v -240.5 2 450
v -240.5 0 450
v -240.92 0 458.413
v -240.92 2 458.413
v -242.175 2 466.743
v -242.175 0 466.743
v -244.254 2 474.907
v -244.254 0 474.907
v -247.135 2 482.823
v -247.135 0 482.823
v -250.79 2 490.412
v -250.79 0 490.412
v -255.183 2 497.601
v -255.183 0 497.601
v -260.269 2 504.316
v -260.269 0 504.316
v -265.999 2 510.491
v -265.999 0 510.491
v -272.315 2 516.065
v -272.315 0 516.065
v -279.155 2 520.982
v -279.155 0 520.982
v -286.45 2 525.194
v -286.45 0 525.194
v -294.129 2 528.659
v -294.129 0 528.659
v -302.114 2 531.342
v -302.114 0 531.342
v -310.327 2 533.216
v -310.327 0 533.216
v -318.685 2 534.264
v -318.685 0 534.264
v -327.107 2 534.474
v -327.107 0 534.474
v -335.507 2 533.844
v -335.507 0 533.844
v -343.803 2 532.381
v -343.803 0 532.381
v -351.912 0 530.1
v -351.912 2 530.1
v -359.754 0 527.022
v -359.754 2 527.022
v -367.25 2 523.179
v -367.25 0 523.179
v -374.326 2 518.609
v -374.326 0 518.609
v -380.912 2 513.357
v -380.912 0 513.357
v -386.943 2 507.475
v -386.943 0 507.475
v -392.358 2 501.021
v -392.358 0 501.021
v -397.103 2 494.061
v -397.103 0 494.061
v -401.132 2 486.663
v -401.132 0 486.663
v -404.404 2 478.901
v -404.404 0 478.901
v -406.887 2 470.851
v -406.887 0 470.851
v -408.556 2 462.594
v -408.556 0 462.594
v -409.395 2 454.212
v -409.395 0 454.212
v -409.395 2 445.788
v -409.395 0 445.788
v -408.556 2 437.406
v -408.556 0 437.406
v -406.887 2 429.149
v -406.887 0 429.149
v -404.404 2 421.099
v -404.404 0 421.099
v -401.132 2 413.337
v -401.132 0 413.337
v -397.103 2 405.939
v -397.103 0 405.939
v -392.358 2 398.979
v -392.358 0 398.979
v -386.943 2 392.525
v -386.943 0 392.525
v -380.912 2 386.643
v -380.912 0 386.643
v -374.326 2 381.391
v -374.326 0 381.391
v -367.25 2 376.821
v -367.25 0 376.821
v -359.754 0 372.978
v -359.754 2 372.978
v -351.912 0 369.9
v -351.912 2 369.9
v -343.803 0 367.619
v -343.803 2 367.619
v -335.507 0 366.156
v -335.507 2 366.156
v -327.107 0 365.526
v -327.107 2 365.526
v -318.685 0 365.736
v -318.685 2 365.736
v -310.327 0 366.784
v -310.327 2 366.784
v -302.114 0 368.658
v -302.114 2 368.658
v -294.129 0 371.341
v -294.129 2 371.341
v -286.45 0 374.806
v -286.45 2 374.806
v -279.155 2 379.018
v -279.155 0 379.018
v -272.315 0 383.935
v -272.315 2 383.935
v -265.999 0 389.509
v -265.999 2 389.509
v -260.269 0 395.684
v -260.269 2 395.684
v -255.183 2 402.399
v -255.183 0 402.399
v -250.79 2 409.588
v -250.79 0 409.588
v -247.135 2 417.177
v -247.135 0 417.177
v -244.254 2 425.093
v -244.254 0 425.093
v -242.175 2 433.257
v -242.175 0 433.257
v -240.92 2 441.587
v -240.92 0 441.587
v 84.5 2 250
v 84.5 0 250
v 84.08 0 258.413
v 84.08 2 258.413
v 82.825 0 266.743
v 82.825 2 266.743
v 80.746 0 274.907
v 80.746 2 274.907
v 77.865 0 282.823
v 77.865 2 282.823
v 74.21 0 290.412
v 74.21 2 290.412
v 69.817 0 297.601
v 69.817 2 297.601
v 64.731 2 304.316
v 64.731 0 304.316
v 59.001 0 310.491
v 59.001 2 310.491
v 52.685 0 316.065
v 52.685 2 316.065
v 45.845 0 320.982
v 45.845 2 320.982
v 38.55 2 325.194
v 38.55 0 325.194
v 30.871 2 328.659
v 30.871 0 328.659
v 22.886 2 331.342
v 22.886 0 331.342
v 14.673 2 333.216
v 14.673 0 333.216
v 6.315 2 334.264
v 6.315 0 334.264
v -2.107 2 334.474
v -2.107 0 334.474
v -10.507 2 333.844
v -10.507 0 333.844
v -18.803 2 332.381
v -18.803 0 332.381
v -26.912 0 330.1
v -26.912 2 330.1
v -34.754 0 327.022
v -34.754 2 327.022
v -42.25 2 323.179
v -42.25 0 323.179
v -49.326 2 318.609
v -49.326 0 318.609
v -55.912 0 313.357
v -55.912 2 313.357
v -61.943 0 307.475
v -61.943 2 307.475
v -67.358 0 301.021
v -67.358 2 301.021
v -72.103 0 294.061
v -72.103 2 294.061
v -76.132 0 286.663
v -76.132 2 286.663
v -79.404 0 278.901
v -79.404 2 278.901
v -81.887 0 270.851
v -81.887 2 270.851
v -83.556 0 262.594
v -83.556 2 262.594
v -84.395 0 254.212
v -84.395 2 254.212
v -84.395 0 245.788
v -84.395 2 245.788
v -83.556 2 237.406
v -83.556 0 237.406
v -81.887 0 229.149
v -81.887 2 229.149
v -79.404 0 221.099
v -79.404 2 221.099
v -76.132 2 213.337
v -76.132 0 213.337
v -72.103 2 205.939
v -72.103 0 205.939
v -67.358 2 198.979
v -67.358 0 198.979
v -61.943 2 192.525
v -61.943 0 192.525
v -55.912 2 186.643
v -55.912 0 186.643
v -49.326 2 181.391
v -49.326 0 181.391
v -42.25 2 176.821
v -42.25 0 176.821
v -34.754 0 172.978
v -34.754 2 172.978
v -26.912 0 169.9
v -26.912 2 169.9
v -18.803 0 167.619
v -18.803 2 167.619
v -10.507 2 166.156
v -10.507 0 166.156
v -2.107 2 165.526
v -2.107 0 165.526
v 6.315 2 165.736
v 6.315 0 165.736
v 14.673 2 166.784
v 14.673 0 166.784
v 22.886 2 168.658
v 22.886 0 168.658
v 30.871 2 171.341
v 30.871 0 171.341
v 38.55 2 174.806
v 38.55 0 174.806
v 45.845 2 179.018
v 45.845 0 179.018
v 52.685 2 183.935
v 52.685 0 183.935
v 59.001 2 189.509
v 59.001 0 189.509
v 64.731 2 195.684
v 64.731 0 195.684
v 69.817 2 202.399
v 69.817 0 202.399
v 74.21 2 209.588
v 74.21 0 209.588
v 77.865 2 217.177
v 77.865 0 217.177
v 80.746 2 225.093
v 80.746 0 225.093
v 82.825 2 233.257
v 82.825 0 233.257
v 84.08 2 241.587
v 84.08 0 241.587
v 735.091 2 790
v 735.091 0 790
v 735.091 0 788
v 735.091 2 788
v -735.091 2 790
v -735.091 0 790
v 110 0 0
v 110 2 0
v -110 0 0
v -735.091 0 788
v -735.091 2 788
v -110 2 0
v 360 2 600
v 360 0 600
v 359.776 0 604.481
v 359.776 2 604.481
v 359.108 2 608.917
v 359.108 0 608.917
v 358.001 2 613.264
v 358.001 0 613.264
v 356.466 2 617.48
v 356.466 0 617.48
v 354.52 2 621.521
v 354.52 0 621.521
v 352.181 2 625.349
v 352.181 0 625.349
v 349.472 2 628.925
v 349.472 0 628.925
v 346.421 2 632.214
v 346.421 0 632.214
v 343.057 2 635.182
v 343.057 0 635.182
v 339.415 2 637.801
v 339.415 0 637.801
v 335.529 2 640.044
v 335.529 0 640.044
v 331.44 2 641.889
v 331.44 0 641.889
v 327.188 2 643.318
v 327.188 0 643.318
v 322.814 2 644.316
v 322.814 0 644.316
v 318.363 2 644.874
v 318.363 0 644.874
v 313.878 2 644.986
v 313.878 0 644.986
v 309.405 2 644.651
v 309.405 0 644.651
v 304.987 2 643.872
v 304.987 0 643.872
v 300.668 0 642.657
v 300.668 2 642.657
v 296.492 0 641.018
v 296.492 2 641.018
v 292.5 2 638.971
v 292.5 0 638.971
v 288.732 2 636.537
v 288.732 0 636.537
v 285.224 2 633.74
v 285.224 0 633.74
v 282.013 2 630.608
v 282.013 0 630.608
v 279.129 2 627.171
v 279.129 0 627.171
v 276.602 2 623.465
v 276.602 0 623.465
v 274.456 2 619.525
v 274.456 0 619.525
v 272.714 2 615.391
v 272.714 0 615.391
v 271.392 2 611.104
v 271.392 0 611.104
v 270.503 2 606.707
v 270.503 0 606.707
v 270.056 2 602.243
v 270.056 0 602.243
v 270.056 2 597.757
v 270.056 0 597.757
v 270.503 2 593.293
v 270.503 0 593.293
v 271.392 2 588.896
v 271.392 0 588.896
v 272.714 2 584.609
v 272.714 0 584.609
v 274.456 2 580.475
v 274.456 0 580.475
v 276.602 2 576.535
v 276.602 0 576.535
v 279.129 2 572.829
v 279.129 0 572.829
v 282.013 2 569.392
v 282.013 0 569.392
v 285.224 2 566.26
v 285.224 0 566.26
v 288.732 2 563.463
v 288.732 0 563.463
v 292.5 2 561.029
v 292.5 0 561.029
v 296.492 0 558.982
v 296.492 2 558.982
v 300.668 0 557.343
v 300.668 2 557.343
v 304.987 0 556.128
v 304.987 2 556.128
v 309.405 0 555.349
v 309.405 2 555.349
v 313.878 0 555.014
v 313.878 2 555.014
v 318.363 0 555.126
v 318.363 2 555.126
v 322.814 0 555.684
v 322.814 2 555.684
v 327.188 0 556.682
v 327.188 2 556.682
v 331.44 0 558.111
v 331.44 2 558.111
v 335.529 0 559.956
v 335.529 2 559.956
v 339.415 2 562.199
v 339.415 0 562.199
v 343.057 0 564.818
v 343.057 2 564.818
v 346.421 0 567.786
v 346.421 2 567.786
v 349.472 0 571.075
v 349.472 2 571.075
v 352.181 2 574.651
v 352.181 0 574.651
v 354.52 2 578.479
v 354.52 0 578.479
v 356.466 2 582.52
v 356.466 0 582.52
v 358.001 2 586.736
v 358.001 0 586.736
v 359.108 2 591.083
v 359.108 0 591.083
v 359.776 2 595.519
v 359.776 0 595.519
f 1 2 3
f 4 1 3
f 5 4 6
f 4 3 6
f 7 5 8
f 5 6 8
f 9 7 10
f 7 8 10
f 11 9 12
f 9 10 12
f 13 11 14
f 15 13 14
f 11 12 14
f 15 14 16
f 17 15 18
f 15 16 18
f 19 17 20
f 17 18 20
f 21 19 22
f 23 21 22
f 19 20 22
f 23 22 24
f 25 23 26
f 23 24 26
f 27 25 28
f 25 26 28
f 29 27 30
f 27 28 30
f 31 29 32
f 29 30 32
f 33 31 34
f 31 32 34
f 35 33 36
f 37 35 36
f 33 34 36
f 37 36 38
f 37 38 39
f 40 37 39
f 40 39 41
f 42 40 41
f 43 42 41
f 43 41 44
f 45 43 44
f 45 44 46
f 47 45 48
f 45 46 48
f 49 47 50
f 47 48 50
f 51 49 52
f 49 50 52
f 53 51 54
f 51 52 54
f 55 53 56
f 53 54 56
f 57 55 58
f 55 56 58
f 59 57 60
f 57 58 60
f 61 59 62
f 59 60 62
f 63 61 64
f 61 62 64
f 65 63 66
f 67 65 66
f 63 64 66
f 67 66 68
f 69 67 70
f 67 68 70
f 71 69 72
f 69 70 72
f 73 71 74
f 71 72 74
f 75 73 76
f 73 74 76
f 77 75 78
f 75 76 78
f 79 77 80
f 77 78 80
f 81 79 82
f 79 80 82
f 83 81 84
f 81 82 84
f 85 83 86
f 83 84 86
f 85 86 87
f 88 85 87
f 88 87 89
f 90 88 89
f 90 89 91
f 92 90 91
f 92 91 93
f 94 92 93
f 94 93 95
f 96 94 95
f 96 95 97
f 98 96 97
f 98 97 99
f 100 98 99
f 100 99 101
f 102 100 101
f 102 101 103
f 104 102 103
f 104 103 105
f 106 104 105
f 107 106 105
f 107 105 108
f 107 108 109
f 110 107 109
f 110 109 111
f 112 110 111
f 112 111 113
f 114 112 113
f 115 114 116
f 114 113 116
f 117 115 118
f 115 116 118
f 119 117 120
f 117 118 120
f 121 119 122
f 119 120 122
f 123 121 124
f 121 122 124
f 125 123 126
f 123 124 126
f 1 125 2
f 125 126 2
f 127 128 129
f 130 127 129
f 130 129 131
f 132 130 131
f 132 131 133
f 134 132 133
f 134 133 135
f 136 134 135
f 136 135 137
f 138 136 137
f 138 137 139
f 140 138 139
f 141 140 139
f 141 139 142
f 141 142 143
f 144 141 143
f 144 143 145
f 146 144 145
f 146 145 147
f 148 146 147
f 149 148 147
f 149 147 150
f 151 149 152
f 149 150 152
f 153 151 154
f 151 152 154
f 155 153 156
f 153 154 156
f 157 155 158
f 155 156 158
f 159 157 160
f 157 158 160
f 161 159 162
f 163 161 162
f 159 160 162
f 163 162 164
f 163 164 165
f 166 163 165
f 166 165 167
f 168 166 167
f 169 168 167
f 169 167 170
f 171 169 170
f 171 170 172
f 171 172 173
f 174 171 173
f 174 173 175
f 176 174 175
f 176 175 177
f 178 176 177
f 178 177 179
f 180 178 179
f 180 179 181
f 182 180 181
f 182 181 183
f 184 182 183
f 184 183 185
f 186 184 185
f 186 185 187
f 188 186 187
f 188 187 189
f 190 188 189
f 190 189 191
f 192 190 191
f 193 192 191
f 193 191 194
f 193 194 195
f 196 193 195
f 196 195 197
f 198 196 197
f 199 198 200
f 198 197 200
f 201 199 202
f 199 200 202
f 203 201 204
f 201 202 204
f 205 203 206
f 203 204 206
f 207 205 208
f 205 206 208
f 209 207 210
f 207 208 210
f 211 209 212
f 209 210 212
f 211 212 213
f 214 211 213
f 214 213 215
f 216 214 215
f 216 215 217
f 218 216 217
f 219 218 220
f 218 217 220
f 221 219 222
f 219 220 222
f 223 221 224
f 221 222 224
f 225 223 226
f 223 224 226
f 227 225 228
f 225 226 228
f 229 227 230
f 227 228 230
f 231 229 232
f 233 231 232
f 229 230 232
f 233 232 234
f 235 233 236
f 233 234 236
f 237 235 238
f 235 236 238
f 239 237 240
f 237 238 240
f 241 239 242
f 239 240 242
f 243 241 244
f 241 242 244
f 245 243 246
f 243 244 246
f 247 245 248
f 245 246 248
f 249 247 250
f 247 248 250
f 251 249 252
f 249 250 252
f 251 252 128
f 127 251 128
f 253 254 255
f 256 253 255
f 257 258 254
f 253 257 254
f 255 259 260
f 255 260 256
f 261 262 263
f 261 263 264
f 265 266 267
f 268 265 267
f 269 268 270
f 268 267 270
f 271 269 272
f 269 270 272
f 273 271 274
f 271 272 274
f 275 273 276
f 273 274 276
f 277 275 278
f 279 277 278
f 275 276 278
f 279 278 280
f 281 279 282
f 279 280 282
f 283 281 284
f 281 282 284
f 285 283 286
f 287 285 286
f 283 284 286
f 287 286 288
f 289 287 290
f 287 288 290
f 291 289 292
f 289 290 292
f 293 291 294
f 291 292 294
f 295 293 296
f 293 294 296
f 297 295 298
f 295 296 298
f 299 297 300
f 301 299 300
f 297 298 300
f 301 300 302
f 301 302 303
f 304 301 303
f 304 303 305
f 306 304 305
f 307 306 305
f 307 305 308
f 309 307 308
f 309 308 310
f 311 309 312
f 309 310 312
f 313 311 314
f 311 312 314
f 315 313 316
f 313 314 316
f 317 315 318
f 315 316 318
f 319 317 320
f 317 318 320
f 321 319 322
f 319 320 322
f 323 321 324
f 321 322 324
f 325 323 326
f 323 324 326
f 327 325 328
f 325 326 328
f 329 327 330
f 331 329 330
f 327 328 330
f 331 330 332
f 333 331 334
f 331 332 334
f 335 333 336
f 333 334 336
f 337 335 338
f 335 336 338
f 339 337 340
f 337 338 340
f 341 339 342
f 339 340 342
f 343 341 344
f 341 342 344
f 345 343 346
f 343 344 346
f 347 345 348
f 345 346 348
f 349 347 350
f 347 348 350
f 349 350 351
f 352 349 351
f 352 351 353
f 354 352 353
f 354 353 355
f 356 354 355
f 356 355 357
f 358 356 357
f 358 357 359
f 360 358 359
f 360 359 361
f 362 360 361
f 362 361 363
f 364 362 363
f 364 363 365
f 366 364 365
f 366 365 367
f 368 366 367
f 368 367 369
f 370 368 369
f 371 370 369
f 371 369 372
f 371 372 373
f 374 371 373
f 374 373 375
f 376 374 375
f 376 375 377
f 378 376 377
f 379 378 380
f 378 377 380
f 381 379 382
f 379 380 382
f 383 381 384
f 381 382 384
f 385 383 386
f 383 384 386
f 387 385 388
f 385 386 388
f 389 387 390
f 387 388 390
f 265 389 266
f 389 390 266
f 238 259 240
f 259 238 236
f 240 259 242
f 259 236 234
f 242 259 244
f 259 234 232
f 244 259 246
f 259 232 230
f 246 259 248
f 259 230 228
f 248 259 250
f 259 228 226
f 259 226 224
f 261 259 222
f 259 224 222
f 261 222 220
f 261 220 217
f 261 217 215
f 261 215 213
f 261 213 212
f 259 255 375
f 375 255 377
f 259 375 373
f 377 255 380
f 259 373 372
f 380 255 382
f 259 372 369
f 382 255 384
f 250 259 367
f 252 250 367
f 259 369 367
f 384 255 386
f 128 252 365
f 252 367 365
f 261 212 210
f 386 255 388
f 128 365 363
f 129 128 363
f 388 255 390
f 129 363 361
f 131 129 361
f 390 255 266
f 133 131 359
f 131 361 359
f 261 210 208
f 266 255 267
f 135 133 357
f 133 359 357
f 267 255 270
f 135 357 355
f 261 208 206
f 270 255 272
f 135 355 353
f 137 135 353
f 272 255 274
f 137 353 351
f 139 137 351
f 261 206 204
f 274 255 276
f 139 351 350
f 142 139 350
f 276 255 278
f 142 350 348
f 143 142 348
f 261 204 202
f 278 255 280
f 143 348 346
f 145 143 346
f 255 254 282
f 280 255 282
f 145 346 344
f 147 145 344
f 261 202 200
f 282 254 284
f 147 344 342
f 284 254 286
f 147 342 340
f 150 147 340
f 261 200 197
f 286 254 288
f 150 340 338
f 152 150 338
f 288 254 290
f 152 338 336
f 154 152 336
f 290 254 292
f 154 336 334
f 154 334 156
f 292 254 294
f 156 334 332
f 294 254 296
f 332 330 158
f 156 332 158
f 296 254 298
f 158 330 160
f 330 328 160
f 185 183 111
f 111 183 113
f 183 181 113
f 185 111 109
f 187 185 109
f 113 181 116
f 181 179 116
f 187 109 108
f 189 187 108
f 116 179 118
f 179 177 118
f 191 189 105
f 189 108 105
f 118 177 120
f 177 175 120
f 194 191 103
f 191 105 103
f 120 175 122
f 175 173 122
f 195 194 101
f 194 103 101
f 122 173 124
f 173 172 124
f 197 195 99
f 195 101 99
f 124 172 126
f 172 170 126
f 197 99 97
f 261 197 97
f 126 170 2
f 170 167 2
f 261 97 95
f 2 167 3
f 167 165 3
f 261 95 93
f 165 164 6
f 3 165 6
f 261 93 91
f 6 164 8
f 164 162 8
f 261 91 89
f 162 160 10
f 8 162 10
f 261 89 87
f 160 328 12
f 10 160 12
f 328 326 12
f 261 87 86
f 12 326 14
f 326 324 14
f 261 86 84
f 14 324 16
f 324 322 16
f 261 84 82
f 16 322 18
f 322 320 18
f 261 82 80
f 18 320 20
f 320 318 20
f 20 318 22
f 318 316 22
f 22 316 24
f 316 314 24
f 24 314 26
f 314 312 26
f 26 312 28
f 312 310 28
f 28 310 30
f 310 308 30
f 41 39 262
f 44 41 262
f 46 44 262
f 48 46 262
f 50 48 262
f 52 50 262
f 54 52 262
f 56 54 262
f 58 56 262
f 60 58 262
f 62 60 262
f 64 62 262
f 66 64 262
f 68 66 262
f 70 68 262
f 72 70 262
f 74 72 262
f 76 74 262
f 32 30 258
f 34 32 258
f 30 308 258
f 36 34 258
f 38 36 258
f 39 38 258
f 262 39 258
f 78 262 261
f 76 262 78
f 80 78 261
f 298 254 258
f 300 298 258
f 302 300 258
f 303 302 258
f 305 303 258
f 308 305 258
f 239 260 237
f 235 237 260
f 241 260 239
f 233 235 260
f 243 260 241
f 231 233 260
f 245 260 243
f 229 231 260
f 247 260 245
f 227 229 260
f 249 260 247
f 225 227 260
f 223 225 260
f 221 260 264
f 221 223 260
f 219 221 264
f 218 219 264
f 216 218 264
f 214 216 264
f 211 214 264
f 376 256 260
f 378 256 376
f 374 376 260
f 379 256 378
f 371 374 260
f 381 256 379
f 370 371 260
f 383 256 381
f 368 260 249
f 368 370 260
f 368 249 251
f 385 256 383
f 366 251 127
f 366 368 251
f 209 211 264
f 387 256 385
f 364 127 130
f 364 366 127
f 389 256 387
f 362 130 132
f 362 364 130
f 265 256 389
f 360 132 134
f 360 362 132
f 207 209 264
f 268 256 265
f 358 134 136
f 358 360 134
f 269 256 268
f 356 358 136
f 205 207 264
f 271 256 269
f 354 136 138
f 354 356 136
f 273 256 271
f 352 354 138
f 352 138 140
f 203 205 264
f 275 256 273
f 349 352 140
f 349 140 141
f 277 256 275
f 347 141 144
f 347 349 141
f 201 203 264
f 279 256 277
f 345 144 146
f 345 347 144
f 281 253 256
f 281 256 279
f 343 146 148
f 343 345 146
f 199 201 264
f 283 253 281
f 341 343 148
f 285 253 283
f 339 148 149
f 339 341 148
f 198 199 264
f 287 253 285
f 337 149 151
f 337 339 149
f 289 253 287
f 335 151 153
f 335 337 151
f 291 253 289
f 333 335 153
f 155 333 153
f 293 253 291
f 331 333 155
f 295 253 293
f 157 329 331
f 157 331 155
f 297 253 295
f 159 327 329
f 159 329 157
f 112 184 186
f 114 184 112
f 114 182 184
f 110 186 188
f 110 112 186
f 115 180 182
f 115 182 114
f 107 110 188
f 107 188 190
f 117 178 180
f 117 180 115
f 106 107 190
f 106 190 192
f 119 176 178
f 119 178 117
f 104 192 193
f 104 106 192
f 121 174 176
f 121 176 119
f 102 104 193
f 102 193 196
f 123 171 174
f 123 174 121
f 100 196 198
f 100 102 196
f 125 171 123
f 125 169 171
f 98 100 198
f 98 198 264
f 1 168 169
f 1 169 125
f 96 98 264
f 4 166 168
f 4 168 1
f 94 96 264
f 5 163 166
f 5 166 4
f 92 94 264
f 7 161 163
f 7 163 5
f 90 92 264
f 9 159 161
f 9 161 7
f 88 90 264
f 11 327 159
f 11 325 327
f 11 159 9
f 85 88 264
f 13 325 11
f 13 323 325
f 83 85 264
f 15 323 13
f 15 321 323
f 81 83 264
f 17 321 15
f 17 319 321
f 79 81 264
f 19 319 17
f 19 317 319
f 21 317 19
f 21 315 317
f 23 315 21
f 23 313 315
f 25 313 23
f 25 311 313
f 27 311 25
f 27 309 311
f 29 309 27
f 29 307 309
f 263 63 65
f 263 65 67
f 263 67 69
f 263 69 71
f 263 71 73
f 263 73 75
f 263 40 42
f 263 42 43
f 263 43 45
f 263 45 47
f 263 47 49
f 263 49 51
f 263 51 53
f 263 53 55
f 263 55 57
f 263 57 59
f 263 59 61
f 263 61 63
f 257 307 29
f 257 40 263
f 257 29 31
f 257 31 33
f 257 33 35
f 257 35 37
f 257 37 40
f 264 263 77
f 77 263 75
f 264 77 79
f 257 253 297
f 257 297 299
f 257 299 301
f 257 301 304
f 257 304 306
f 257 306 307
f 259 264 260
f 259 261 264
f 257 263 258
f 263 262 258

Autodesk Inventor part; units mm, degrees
ref_plane "YZ Plane" through (0, 0, 0) normal (1, 0, 0) x (0, 1, 0)
ref_plane "XZ Plane" through (0, 0, 0) normal (0, 1, 0) x (-1, 0, 0)
ref_plane "XY Plane" through (0, 0, 0) normal (0, 0, 1) x (1, 0, 0)
sketch "Sketch1" plane through (0, 0, 0) normal (0, 1, 0) x (-1, 0, 0)
  line L0 (0, 790) -> (0, 0)
  line L1 (735.0906, 788) -> (735.0906, 790)
  line L2 (735.0906, 790) -> (0, 790)
  line L3 (735.0906, 788) -> (110, 0)
  line L4 (110, 0) -> (0, 0)
  line L5 (735.9762, 809.1108) -> (102.084, 10.0153)
  point P0 (648.1236, 678.3679)
  point P1 (0, 678)
  dimension "d1" = 735.0906
  dimension "d2" = 2
  dimension "d5" = 128.424
  dimension "d6" = 110
  dimension "d9" = 790
  dimension "d28" = 128.424
extrude "Plate1" add sketch "Sketch1" along normal blind 2
mirror "Mirror1" about plane through (0, 0, 0) normal (1, 0, 0)
sketch "Sketch2" plane through (0, 0, 0) normal (0, -1, 0) x (1, 0, 0)
  line L0 (-110, 0) -> (110, 0) construction
  line L1 (-110, 0) -> (-735.0906, 788) construction
  circle A0 centre (-325, 450) radius 84.5
  line L2 (110, 0) -> (735.0906, 788) construction
  circle A1 centre (0, 250) radius 84.5
  circle A2 centre (315, 600) radius 45
  line L3 (-110, 0) -> (110, 0) construction
  line L4 (-240.5, 450) -> (-240.5, 164.5105) construction
  line L5 (-84.5, 250) -> (-84.5, 0) construction
  line L6 (84.5, 250) -> (84.5, 0) construction
  line L7 (270, 600) -> (270, 0) construction
  line L8 (-325, 534.5) -> (270, 534.5) construction
  line L9 (-325, 365.5) -> (270, 365.5) construction
  line L10 (0, 334.5) -> (270, 334.5) construction
  line L11 (315, 555) -> (270, 555) construction
  line L12 (-735.0906, 790) -> (735.0906, 790) projected
  line L13 (-735.0906, 788) -> (-735.0906, 790) projected
  line L14 (735.0906, 788) -> (735.0906, 790) projected
  point P0 (0, 0)
  point P1 (0, 0)
  point P2 (0, 0)
  point P3 (0, 0)
  point P4 (-84.5, 144.3746)
  point P5 (0, 0)
  point P6 (0, 0)
  dimension "d13" = 169
  dimension "d16" = 250
  dimension "d17" = 450
  dimension "d18" = 325
  dimension "d19" = 31
  dimension "d20" = 90
  dimension "d21" = 156
  dimension "d23" = 315
  dimension "d24" = 600
extrude "Extrusion1" cut sketch "Sketch2" against normal through all
sketch "Sketch3" plane through (0, 0, 0) normal (0, -1, 0) x (1, 0, 0)
  line L0 (-55, 616) -> (-55, 628) construction
  line L1 (-55, 628) -> (55, 628) construction
  line L2 (55, 628) -> (55, 616) construction
  line L3 (55, 616) -> (-55, 616) construction
  line L4 (-663.2335, 678) -> (663.2335, 678) projected
  point P0 (0, 0)
  point P1 (0, 616)
  point P2 (0, 678)
  dimension "d25" = 12
  dimension "d26" = 110
  dimension "d27" = 50
mark "Mark1"
equation "\"d3\" = Thickness"
equation "\"BendReliefWidth\" = Thickness"
equation "\"BendReliefDepth\" = 0.5 * Thickness"
equation "\"CornerReliefSize\" = 4 * Thickness"
equation "\"MinimumRemnant\" = 2 * Thickness"
equation "\"GapSize\" = Thickness"
equation "\"Thickness\" = 2"
properties part number "MSC 701 face 1" material "Stainless Steel"
